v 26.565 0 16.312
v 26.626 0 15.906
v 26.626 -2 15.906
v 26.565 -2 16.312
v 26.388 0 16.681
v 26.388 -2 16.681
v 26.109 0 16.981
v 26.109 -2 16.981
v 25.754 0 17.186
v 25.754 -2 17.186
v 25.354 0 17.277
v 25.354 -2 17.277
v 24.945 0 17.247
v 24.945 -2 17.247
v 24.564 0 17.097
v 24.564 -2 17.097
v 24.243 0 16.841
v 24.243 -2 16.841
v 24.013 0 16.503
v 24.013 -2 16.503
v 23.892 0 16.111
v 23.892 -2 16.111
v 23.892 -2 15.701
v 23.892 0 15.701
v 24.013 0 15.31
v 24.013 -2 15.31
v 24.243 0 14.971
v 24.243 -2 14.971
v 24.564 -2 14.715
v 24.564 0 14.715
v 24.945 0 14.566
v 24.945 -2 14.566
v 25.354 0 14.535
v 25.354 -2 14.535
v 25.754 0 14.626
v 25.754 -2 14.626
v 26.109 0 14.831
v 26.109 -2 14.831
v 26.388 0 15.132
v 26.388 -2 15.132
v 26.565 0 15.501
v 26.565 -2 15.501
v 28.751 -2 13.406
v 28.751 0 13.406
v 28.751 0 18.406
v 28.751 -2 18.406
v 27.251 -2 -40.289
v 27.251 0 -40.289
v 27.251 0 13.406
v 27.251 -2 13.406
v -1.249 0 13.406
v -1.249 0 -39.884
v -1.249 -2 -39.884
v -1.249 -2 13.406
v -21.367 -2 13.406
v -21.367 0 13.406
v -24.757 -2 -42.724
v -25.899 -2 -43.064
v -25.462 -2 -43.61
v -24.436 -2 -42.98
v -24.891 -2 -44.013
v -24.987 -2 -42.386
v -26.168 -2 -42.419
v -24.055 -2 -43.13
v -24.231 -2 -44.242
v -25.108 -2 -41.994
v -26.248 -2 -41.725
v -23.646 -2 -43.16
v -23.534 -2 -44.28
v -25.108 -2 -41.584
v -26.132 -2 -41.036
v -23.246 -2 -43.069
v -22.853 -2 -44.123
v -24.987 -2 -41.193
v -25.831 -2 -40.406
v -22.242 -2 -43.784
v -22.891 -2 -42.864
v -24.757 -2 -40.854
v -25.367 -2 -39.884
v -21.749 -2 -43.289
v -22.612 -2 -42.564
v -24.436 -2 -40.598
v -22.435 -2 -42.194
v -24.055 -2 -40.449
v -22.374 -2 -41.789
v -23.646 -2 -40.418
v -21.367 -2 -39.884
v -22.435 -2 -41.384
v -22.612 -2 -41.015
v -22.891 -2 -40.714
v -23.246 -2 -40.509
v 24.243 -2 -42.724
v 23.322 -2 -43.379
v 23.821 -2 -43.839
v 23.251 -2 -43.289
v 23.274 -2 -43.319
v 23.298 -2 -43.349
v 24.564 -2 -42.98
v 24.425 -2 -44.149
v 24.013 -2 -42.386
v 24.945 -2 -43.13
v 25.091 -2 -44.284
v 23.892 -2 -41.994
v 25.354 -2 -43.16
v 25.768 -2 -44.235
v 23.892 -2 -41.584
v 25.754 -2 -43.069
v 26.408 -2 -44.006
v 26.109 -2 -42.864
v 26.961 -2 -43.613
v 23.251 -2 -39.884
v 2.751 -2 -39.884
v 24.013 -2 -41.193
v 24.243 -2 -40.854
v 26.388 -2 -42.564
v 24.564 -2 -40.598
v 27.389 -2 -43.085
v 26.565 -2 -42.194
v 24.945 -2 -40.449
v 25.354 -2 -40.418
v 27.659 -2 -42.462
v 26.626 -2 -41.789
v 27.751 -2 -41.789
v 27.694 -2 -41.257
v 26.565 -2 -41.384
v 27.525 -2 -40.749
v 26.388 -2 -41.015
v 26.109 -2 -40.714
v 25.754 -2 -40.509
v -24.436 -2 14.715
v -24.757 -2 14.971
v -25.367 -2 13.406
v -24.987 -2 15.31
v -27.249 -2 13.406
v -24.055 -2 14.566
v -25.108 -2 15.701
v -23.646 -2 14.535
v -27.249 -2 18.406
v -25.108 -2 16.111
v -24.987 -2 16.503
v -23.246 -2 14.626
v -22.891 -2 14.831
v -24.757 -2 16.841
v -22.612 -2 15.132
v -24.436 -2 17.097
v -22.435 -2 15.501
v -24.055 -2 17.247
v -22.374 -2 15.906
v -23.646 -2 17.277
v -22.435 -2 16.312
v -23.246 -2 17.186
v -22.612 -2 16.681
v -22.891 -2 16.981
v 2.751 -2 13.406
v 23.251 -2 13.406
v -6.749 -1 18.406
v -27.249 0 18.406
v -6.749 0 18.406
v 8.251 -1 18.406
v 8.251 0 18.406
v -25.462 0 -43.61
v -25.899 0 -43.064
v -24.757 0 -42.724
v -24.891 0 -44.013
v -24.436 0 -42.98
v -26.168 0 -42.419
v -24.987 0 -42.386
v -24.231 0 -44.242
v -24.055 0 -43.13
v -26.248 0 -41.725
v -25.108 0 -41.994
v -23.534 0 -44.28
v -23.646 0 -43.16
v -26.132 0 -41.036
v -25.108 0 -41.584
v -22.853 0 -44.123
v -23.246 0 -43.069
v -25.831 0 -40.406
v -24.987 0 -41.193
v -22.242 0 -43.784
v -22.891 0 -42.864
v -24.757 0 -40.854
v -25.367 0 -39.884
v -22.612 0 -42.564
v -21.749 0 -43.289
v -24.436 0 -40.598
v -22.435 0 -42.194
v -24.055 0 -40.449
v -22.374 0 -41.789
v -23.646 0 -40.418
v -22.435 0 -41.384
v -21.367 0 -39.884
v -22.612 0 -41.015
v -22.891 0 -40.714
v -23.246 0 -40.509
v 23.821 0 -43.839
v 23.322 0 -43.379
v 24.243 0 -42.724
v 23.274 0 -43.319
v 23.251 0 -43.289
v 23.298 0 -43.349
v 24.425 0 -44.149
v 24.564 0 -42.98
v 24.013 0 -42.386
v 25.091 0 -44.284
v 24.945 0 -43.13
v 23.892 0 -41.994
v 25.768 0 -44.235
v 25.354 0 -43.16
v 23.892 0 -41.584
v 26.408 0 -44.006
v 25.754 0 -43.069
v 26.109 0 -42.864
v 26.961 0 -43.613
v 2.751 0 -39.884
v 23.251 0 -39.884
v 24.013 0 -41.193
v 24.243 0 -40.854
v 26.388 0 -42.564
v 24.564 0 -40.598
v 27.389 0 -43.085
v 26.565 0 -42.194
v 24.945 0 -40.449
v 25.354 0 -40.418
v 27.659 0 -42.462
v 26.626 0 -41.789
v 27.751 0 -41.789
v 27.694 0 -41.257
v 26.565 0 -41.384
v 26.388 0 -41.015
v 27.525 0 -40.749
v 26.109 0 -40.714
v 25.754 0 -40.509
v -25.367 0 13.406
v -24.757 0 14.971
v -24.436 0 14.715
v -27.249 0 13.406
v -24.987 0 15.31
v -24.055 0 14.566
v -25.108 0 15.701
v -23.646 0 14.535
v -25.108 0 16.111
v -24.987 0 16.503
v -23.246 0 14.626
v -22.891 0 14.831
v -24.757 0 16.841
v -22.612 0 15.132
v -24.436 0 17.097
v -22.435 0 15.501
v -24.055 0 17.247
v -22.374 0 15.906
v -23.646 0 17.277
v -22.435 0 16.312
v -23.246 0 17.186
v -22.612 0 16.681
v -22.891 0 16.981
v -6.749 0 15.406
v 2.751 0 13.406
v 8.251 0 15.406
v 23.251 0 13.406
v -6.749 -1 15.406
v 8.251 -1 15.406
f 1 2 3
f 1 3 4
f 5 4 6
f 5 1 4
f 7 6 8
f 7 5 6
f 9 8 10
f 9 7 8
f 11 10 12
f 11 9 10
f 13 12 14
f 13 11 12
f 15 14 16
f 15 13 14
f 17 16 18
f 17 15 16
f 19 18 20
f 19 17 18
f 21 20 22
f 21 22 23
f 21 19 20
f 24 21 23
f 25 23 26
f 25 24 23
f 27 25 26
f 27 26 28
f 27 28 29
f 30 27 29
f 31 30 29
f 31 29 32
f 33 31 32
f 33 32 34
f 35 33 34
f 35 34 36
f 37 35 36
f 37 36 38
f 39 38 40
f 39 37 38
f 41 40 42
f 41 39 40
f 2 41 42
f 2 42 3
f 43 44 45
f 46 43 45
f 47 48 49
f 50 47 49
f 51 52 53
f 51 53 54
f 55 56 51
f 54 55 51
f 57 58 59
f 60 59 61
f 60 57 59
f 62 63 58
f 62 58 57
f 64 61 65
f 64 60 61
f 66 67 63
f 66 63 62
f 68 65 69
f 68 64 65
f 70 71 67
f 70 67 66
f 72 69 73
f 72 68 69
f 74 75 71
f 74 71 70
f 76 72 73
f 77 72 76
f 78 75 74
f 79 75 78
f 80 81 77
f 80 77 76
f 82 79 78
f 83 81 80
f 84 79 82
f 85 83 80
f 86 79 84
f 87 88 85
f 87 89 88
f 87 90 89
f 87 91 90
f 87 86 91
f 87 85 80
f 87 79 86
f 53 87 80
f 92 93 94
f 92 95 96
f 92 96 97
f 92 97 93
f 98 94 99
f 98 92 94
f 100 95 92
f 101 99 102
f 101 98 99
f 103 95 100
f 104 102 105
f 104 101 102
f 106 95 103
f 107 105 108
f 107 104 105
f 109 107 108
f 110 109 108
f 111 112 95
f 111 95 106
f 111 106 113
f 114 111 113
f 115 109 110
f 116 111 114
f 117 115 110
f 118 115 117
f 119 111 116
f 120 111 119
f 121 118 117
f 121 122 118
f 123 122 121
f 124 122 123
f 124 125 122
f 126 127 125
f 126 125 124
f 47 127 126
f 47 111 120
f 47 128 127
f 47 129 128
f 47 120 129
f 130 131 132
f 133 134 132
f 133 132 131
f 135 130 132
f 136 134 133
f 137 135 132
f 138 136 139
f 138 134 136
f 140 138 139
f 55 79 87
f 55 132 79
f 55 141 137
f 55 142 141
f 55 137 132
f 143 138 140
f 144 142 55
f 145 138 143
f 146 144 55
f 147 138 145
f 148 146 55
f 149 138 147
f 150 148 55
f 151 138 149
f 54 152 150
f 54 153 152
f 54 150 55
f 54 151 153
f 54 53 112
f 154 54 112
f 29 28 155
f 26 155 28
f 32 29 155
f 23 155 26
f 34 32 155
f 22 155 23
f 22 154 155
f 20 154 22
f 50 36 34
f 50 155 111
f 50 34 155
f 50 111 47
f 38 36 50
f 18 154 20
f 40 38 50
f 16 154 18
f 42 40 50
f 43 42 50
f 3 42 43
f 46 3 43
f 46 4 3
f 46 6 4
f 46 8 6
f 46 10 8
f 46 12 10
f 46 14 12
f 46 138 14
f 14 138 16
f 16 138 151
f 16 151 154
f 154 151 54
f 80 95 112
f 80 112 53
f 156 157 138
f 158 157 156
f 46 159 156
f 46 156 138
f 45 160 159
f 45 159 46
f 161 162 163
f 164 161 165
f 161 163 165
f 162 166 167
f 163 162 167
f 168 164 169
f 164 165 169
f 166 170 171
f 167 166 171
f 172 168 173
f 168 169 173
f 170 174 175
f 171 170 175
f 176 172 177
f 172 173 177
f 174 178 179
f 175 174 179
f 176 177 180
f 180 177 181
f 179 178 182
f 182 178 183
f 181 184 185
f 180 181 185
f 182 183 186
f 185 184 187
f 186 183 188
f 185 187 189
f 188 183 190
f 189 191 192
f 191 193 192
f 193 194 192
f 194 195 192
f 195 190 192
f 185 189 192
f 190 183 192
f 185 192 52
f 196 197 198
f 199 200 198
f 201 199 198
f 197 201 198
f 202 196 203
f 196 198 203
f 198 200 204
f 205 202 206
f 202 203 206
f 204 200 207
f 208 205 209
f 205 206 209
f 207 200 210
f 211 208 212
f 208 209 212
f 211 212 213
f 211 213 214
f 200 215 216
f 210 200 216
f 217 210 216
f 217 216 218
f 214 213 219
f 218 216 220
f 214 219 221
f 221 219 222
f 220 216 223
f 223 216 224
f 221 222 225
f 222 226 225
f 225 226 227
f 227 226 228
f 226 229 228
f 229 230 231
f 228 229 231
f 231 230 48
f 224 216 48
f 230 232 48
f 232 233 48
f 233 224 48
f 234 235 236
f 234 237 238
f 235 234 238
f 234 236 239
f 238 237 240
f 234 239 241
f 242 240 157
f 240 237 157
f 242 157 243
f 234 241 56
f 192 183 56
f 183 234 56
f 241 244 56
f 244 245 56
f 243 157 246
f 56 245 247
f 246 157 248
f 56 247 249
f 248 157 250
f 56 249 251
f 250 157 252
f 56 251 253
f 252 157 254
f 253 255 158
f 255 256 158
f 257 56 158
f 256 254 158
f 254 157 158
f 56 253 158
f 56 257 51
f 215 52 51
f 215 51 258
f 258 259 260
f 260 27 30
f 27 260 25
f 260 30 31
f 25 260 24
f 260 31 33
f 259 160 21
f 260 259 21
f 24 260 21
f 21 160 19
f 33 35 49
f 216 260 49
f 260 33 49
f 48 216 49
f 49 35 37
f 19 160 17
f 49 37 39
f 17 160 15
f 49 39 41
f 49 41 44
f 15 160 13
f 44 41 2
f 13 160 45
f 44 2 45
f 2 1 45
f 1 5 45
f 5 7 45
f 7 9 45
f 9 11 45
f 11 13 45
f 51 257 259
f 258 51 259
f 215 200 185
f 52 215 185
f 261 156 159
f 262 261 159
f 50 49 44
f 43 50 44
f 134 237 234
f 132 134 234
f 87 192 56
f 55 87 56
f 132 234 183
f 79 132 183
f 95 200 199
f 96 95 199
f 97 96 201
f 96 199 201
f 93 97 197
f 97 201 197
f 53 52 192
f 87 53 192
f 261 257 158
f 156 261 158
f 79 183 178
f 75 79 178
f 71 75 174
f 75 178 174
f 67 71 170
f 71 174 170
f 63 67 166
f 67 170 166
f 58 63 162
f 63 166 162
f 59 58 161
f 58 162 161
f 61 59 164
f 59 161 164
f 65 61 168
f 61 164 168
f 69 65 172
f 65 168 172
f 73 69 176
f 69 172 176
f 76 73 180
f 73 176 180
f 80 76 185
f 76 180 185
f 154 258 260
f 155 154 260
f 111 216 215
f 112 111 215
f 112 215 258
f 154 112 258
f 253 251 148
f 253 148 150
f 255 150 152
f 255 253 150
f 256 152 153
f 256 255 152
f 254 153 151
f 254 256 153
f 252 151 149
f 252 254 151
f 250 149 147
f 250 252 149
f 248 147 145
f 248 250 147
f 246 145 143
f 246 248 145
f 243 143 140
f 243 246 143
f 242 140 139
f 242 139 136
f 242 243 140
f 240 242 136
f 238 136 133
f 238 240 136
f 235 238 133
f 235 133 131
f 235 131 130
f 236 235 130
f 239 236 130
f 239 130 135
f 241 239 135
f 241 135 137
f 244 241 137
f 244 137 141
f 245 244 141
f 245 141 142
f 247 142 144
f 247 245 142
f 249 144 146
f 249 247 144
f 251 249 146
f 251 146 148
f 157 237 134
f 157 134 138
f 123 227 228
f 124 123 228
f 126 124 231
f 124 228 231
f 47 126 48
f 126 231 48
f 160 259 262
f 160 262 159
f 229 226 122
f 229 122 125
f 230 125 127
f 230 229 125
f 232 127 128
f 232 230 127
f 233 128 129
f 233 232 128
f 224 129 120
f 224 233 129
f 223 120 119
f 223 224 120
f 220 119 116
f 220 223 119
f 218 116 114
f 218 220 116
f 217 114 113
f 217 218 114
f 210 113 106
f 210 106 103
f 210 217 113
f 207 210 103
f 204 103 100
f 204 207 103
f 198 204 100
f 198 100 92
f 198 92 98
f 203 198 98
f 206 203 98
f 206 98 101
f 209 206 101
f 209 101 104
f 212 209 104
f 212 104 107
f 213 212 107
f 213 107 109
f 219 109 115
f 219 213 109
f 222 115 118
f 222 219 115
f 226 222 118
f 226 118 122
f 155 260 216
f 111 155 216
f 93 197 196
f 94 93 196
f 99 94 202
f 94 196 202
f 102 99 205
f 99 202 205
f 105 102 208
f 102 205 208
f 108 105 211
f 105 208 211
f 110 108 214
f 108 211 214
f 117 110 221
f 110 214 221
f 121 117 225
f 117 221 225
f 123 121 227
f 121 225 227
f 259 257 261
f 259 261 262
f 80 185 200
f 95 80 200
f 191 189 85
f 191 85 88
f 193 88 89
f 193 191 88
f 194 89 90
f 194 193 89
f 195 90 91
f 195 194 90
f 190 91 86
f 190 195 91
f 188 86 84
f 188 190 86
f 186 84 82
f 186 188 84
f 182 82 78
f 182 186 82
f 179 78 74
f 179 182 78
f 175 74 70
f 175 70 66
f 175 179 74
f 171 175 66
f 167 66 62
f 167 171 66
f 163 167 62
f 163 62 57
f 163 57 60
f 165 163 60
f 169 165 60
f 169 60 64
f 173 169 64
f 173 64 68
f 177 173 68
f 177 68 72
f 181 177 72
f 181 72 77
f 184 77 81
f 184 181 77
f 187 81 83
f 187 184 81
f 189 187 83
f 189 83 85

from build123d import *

# Parameters (mm, degrees)
F1_W     = 56
F1_H     = 5
F1_R     = 1.375
F2_DEPTH = 2
F0_W     = 15
F0_H     = 3
F3_DEPTH = 1
F4_R     = 1.375
F4_W     = 4
F4_H     = 53.2898265516
F5_DEPTH = 2


with BuildPart() as f2:
    # F1 (on Front) → F2 (new body)
    with BuildSketch(Plane.XZ):
        with Locations((0.7514315657, 15.9062612424)):
            Rectangle(F1_W, F1_H)
        with Locations((-23.7485684343, 15.9062612424)):
            Circle(F1_R, mode=Mode.SUBTRACT)
        with Locations((25.2514315657, 15.9062612424)):
            Circle(F1_R, mode=Mode.SUBTRACT)
    extrude(amount=F2_DEPTH)

    # F0 (on Front) → F3 (cut)
    with BuildSketch(Plane.XZ):
        with Locations((0.7514315657, 16.9062612424)):
            Rectangle(F0_W, F0_H)
    extrude(amount=F3_DEPTH, mode=Mode.SUBTRACT)

    # F4 (on Front) → F5 (join)
    with BuildSketch(Plane.XZ):
        with BuildLine():
            Line((-22.1303412057, -39.8835653092), (-25.3667956628, -39.8835653092))
            ThreePointArc((-25.3667956628, -39.8835653092), (-25.4620381693, -43.6096183945), (-21.7485684343, -43.289172991))
            ThreePointArc((-21.7485684343, -43.289172991), (-21.3768601891, -42.579742406), (-21.2485684343, -41.789172991))
            ThreePointArc((-21.2485684343, -41.789172991), (-21.4796955785, -40.7393082548), (-22.1303412057, -39.8835653092))
        make_face()
        with Locations((-23.7485684343, -41.789172991)):
            Circle(F4_R, mode=Mode.SUBTRACT)
        with BuildLine():
            Line((-25.3667956628, 13.6541156098), (-25.3667956628, -39.8835653092))
            ThreePointArc((-25.3667956628, -39.8835653092), (-23.7485684343, -39.289172991), (-22.1303412057, -39.8835653092))
            Line((-22.1303412057, -39.8835653092), (-21.3667956628, -39.8835653092))
            Line((-21.3667956628, -39.8835653092), (-21.3667956628, 9.7079015317))
            Line((-21.3667956628, 9.7079015317), (-21.3667956628, 13.6541156098))
            Line((-21.3667956628, 13.6541156098), (-25.3667956628, 13.6541156098))
        make_face()
        with BuildLine():
            ThreePointArc((-22.1303412057, -39.8835653092), (-23.7485684343, -39.289172991), (-25.3667956628, -39.8835653092))
            Line((-25.3667956628, -39.8835653092), (-22.1303412057, -39.8835653092))
        make_face()
        with BuildLine():
            ThreePointArc((-21.2485684343, -41.789172991), (-21.3768601891, -42.579742406), (-21.7485684343, -43.289172991))
            Line((-21.7485684343, -43.289172991), (-21.3667956628, -43.289172991))
            Line((-21.3667956628, -43.289172991), (23.2514315657, -43.289172991))
            ThreePointArc((23.2514315657, -43.289172991), (22.7514315657, -41.789172991), (23.2514315657, -40.289172991))
            Line((23.2514315657, -40.289172991), (23.2514315657, -39.8835653092))
            Line((23.2514315657, -39.8835653092), (20.2613644372, -39.8835653092))
            Line((20.2613644372, -39.8835653092), (2.7514315657, -39.8835653092))
            Line((2.7514315657, -39.8835653092), (-1.2485684343, -39.8835653092))
            Line((-1.2485684343, -39.8835653092), (-21.3667956628, -39.8835653092))
            Line((-21.3667956628, -39.8835653092), (-22.1303412057, -39.8835653092))
            ThreePointArc((-22.1303412057, -39.8835653092), (-21.4796955785, -40.7393082548), (-21.2485684343, -41.789172991))
        make_face()
        with BuildLine():
            Line((23.3217352043, -43.3785980293), (23.2514315657, -43.289172991))
            ThreePointArc((23.2514315657, -43.289172991), (23.2860747069, -43.3342854197), (23.3217352043, -43.3785980293))
        make_face()
        with BuildLine():
            ThreePointArc((23.2514315657, -40.289172991), (22.7514315657, -41.789172991), (23.2514315657, -43.289172991))
            Line((23.2514315657, -43.289172991), (23.2514315657, -40.289172991))
        make_face()
        with BuildLine():
            Line((23.2514315657, -40.289172991), (23.2514315657, -43.289172991))
            Line((23.2514315657, -43.289172991), (23.3217352043, -43.3785980293))
            ThreePointArc((23.3217352043, -43.3785980293), (26.0957535115, -44.1422816693), (27.7514315657, -41.789172991))
            ThreePointArc((27.7514315657, -41.789172991), (27.6231398109, -40.998603576), (27.2514315657, -40.289172991))
            Line((27.2514315657, -40.289172991), (23.2514315657, -40.289172991))
        make_face()
        with Locations((25.2514315657, -41.789172991)):
            Circle(F4_R, mode=Mode.SUBTRACT)
        with Locations((0.7514315657, -13.2386520334)):
            Rectangle(F4_W, F4_H)
        with BuildLine():
            Line((23.2514315657, -39.8835653092), (23.2514315657, -40.289172991))
            ThreePointArc((23.2514315657, -40.289172991), (25.2514315657, -39.289172991), (27.2514315657, -40.289172991))
            Line((27.2514315657, -40.289172991), (27.2514315657, 13.6541156098))
            Line((27.2514315657, 13.6541156098), (23.2514315657, 13.6541156098))
            Line((23.2514315657, 13.6541156098), (23.2514315657, -35.9635577695))
            Line((23.2514315657, -35.9635577695), (23.2514315657, -39.8835653092))
        make_face()
        with BuildLine():
            ThreePointArc((27.2514315657, -40.289172991), (25.2514315657, -39.289172991), (23.2514315657, -40.289172991))
            Line((23.2514315657, -40.289172991), (27.2514315657, -40.289172991))
        make_face()
    extrude(amount=F5_DEPTH)


solid = f2.part
